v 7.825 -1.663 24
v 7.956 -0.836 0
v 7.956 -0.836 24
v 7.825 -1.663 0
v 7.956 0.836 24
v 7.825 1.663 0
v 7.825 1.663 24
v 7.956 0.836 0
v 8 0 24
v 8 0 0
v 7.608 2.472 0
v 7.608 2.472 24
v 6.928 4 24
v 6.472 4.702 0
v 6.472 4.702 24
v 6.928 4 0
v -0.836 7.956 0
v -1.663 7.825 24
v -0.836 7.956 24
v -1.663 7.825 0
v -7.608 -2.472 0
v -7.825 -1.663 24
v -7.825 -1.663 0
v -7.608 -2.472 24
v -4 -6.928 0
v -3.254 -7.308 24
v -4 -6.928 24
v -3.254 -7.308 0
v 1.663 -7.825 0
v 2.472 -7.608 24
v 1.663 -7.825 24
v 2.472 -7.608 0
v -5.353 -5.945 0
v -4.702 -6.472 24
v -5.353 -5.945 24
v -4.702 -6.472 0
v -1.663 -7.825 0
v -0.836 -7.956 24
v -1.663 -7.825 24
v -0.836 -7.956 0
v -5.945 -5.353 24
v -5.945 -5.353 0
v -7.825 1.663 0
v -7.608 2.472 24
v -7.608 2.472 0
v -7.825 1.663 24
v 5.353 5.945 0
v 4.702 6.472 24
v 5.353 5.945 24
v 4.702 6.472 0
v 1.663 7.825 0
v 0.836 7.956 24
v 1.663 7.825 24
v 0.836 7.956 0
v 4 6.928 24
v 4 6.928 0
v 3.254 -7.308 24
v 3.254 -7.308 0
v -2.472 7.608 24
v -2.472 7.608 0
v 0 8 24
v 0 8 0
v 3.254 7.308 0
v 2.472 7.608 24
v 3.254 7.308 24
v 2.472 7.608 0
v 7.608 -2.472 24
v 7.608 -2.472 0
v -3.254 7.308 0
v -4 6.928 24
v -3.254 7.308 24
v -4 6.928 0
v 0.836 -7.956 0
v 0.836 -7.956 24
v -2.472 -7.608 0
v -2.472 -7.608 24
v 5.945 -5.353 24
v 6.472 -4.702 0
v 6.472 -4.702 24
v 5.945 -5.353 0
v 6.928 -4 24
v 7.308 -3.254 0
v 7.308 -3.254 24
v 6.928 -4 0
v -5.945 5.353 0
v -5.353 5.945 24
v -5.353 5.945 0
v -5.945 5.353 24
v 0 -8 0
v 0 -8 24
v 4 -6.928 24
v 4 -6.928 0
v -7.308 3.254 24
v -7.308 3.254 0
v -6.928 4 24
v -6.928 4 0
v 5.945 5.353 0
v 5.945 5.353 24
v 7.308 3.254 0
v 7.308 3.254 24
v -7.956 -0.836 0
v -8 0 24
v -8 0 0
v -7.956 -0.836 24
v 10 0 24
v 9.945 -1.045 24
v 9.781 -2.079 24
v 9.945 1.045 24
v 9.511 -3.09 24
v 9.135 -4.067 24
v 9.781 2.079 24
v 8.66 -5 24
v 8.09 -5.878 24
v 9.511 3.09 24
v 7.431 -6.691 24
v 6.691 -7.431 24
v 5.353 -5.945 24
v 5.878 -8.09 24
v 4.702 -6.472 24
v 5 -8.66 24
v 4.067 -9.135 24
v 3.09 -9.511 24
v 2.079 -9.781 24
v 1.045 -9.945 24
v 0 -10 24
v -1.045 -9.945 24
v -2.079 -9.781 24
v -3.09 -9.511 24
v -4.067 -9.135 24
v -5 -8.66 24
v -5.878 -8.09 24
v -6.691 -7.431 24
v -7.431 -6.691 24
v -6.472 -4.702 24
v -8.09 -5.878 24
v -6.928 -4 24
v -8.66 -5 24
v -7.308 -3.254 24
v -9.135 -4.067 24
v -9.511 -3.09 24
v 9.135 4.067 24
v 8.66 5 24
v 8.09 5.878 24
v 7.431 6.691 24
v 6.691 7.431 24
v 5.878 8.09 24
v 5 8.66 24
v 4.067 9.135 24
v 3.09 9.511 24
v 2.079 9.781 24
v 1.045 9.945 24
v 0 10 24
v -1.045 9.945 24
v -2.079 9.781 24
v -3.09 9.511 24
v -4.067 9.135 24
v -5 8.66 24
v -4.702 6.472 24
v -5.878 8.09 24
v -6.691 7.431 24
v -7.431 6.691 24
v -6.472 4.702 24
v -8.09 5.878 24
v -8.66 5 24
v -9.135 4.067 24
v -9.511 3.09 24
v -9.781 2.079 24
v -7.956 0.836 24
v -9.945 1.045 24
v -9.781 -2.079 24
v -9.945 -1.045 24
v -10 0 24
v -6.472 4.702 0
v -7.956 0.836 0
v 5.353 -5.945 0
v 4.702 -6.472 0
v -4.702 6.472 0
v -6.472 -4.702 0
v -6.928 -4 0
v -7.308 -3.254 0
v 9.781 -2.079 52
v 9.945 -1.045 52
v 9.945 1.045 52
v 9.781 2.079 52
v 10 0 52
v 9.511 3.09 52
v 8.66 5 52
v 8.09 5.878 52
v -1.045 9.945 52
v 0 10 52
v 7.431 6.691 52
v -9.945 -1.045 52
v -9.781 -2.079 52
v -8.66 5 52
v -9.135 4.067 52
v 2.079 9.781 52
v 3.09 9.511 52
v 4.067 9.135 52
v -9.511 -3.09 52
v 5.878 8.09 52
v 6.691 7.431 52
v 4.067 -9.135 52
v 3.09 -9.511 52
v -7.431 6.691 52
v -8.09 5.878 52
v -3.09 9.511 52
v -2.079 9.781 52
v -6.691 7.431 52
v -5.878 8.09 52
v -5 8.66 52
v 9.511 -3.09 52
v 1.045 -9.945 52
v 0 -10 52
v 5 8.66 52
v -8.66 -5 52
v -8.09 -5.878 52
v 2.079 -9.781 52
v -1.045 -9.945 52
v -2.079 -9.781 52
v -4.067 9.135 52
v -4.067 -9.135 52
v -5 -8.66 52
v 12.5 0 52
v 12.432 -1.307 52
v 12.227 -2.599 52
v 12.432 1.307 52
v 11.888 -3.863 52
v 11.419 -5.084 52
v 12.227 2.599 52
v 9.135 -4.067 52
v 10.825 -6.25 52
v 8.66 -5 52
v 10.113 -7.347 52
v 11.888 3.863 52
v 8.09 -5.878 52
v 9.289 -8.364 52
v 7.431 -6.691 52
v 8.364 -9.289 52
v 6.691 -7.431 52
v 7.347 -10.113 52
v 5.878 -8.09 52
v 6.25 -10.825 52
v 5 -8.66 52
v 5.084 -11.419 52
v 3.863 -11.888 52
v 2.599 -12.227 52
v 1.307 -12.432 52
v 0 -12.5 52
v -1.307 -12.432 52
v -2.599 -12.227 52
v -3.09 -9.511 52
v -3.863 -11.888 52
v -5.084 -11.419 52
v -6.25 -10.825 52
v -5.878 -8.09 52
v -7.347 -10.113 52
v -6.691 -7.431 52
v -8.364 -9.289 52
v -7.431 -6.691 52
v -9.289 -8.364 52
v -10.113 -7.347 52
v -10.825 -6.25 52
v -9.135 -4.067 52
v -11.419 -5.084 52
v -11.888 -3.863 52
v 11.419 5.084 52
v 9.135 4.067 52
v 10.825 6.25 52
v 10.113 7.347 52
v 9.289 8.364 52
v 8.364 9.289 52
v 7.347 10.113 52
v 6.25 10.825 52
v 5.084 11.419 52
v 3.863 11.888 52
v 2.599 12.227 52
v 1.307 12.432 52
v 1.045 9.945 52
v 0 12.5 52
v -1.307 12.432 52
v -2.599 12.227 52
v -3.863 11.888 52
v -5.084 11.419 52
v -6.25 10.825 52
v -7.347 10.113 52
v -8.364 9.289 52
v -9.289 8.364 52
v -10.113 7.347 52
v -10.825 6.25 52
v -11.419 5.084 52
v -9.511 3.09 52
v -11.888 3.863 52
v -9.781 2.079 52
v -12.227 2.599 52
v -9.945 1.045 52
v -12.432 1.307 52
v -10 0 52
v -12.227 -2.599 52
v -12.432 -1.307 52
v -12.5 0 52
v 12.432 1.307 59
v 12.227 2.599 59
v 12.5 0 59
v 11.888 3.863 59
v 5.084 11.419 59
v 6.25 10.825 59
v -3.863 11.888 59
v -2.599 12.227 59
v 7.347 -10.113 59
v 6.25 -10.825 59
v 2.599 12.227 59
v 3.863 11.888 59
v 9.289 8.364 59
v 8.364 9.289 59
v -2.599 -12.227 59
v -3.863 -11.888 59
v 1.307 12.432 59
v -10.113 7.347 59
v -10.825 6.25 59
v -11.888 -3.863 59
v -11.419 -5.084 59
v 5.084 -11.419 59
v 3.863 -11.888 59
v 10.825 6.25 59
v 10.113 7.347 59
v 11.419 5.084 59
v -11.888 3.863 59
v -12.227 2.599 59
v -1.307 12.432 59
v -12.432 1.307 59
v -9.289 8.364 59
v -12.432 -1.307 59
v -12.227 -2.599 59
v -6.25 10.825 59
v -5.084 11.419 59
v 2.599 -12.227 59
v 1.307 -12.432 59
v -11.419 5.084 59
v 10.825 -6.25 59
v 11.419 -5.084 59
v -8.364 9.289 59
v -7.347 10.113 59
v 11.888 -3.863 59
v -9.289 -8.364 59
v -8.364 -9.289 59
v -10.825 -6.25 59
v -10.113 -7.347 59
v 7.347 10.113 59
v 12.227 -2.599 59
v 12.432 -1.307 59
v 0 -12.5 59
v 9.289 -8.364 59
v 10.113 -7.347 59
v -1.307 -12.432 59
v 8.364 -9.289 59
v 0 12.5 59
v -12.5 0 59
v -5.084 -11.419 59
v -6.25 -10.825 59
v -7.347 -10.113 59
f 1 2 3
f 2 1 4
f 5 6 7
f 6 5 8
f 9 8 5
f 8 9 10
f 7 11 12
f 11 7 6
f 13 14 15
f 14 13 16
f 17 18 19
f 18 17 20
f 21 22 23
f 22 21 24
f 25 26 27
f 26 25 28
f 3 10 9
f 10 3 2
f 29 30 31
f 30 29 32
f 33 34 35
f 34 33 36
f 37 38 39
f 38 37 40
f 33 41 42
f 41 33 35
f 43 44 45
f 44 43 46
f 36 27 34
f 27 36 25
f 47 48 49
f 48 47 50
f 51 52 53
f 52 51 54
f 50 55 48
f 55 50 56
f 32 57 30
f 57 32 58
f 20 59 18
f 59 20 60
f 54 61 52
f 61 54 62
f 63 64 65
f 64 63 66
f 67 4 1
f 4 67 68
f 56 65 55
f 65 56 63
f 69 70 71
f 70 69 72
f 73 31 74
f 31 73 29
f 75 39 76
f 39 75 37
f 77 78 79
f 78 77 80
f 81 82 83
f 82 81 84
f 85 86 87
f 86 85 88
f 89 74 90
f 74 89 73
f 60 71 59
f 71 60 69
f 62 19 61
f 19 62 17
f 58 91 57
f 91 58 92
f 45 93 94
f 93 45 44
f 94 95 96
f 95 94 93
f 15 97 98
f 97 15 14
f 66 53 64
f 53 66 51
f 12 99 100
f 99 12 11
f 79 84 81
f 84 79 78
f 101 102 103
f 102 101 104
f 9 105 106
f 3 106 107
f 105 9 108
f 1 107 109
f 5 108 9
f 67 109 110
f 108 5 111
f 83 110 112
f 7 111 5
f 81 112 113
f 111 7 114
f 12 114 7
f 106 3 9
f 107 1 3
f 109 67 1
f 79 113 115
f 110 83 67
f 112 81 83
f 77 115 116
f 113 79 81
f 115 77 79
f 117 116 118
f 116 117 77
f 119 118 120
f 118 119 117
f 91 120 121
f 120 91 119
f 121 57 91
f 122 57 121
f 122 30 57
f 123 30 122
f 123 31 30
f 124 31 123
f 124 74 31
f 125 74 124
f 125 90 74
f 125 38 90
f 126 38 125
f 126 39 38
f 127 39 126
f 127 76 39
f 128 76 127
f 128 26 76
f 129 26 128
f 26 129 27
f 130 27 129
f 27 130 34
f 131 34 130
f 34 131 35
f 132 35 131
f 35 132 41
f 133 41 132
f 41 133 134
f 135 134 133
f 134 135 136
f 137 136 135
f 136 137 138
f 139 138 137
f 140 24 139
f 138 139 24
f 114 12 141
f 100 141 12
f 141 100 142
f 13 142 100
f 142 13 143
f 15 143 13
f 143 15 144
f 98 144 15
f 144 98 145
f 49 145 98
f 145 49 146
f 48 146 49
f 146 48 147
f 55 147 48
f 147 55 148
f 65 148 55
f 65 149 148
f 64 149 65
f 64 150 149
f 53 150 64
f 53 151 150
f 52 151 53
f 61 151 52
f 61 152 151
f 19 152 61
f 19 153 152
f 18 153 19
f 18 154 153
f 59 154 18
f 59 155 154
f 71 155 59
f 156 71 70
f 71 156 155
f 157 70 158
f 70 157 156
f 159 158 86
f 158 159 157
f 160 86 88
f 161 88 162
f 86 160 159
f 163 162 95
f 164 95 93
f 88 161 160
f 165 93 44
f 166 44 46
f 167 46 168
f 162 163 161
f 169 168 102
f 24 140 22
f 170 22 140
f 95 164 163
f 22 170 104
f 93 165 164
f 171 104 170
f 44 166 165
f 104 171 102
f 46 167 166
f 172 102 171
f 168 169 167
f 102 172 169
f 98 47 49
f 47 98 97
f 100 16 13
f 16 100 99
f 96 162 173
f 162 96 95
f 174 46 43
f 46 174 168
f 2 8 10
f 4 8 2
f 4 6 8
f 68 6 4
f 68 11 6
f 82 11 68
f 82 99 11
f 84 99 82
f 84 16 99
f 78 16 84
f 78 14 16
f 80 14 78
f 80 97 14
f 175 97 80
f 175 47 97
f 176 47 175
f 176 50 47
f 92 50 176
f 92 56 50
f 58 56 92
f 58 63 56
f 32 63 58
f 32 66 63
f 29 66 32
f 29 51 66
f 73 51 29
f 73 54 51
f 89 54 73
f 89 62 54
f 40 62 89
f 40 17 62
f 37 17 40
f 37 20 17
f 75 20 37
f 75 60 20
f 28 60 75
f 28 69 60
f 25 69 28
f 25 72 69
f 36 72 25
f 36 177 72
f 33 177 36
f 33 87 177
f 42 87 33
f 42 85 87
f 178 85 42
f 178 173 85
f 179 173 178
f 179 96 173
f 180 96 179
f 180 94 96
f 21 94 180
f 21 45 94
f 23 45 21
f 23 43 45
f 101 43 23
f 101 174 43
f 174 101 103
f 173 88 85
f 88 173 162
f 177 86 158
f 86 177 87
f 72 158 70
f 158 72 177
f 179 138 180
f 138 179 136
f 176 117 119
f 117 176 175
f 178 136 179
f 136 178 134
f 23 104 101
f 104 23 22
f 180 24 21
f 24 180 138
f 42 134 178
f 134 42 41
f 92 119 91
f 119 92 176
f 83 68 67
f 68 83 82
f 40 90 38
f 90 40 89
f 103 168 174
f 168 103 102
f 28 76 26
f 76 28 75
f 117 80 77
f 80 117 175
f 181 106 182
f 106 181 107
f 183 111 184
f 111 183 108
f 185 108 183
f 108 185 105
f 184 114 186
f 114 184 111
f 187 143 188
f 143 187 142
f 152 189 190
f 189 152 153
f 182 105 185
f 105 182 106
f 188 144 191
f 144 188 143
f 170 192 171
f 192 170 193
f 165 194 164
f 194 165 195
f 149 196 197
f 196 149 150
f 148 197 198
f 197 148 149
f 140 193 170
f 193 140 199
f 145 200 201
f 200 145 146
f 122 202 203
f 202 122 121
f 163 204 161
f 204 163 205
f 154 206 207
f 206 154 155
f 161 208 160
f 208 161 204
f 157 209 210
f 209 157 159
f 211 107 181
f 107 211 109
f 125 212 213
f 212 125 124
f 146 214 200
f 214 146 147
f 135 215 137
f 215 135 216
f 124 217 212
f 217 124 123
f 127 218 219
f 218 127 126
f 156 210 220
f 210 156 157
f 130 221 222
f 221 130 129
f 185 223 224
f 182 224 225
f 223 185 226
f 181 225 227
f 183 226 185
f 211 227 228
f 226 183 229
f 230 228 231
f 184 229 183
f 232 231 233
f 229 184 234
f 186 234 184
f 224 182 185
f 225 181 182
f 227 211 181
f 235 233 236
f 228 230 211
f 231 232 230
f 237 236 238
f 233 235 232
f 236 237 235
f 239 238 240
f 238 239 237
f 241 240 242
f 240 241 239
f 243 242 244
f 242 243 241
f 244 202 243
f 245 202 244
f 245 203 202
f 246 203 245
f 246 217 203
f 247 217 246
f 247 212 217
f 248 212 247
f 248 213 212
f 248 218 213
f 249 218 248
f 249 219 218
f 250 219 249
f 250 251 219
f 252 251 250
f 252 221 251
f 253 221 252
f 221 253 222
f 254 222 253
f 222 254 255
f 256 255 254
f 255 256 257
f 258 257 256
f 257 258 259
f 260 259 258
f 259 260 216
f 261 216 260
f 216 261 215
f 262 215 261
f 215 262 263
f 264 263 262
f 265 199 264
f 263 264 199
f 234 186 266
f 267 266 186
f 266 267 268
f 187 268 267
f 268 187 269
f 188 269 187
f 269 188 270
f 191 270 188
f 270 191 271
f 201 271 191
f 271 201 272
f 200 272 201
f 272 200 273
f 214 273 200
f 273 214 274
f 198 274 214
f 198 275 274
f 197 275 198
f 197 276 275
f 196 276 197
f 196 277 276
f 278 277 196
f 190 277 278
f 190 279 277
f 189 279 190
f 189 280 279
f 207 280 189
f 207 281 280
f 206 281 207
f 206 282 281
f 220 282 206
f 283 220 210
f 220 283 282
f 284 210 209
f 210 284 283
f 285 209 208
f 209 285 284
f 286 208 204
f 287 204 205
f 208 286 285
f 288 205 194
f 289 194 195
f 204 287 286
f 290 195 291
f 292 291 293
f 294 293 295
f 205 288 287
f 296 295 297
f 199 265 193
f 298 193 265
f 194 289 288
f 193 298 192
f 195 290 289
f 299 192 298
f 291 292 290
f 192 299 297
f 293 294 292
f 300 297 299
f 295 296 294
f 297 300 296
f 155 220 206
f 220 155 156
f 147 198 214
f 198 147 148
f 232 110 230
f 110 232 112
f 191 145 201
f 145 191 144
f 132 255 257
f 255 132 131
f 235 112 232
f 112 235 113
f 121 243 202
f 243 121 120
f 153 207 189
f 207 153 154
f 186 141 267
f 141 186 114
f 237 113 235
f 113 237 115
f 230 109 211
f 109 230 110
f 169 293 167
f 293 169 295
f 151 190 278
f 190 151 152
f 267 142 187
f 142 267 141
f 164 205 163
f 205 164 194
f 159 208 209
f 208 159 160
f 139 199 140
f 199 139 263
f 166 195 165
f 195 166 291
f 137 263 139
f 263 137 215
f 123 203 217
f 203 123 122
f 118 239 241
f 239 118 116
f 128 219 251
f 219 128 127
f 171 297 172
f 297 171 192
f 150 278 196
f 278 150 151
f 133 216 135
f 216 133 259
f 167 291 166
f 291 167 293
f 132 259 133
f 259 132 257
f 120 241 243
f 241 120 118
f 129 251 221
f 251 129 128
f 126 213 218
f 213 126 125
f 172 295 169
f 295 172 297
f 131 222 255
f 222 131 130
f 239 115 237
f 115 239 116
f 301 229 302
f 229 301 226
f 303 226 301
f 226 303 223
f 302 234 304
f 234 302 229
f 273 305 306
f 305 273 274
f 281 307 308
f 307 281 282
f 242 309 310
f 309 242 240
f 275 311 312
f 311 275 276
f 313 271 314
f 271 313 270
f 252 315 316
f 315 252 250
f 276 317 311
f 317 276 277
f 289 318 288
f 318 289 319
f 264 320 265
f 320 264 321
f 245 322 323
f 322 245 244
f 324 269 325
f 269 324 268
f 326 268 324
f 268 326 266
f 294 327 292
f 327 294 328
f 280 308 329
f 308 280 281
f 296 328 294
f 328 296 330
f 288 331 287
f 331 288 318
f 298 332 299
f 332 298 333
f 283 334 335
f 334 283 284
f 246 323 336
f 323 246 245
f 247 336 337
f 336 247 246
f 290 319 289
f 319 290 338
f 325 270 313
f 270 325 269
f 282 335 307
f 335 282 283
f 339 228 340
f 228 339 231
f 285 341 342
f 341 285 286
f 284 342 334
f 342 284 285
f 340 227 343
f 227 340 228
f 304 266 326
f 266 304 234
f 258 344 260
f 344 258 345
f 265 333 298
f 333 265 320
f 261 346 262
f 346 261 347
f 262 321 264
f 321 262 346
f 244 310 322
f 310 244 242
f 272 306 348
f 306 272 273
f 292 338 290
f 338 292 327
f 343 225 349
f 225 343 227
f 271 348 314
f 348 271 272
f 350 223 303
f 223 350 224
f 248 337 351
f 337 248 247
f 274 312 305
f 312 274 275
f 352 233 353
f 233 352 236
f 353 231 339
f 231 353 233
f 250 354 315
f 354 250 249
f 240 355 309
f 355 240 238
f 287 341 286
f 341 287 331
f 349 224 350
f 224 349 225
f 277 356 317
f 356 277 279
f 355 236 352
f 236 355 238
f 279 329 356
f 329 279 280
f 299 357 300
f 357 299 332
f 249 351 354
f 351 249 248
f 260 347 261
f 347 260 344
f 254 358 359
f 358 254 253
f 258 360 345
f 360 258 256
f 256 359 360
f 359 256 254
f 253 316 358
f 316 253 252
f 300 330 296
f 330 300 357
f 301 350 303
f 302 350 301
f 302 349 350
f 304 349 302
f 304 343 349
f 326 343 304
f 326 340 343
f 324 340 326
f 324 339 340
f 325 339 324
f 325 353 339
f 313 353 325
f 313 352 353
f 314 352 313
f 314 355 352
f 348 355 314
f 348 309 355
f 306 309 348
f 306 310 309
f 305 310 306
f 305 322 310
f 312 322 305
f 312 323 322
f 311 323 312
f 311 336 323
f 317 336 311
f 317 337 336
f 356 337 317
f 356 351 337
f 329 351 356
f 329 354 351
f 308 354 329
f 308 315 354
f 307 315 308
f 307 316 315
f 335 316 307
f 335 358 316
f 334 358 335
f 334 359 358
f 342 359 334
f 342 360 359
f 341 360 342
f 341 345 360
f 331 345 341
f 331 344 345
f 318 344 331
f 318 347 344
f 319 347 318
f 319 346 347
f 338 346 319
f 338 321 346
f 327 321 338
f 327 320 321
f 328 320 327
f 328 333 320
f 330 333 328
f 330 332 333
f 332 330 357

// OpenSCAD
// Shoulder bolt.
$fn = 60;
eps = 0.02;
thread_d = 16;
shoulder_d = 20;
shoulder_l = 28;
thread_l = 24;
head_d = shoulder_d + 5;
union() {
    cylinder(d=thread_d,h=thread_l);
    translate([0,0,thread_l]) cylinder(d=shoulder_d,h=shoulder_l);
    translate([0,0,thread_l+shoulder_l]) cylinder(d=head_d,h=shoulder_d*0.35);
}
